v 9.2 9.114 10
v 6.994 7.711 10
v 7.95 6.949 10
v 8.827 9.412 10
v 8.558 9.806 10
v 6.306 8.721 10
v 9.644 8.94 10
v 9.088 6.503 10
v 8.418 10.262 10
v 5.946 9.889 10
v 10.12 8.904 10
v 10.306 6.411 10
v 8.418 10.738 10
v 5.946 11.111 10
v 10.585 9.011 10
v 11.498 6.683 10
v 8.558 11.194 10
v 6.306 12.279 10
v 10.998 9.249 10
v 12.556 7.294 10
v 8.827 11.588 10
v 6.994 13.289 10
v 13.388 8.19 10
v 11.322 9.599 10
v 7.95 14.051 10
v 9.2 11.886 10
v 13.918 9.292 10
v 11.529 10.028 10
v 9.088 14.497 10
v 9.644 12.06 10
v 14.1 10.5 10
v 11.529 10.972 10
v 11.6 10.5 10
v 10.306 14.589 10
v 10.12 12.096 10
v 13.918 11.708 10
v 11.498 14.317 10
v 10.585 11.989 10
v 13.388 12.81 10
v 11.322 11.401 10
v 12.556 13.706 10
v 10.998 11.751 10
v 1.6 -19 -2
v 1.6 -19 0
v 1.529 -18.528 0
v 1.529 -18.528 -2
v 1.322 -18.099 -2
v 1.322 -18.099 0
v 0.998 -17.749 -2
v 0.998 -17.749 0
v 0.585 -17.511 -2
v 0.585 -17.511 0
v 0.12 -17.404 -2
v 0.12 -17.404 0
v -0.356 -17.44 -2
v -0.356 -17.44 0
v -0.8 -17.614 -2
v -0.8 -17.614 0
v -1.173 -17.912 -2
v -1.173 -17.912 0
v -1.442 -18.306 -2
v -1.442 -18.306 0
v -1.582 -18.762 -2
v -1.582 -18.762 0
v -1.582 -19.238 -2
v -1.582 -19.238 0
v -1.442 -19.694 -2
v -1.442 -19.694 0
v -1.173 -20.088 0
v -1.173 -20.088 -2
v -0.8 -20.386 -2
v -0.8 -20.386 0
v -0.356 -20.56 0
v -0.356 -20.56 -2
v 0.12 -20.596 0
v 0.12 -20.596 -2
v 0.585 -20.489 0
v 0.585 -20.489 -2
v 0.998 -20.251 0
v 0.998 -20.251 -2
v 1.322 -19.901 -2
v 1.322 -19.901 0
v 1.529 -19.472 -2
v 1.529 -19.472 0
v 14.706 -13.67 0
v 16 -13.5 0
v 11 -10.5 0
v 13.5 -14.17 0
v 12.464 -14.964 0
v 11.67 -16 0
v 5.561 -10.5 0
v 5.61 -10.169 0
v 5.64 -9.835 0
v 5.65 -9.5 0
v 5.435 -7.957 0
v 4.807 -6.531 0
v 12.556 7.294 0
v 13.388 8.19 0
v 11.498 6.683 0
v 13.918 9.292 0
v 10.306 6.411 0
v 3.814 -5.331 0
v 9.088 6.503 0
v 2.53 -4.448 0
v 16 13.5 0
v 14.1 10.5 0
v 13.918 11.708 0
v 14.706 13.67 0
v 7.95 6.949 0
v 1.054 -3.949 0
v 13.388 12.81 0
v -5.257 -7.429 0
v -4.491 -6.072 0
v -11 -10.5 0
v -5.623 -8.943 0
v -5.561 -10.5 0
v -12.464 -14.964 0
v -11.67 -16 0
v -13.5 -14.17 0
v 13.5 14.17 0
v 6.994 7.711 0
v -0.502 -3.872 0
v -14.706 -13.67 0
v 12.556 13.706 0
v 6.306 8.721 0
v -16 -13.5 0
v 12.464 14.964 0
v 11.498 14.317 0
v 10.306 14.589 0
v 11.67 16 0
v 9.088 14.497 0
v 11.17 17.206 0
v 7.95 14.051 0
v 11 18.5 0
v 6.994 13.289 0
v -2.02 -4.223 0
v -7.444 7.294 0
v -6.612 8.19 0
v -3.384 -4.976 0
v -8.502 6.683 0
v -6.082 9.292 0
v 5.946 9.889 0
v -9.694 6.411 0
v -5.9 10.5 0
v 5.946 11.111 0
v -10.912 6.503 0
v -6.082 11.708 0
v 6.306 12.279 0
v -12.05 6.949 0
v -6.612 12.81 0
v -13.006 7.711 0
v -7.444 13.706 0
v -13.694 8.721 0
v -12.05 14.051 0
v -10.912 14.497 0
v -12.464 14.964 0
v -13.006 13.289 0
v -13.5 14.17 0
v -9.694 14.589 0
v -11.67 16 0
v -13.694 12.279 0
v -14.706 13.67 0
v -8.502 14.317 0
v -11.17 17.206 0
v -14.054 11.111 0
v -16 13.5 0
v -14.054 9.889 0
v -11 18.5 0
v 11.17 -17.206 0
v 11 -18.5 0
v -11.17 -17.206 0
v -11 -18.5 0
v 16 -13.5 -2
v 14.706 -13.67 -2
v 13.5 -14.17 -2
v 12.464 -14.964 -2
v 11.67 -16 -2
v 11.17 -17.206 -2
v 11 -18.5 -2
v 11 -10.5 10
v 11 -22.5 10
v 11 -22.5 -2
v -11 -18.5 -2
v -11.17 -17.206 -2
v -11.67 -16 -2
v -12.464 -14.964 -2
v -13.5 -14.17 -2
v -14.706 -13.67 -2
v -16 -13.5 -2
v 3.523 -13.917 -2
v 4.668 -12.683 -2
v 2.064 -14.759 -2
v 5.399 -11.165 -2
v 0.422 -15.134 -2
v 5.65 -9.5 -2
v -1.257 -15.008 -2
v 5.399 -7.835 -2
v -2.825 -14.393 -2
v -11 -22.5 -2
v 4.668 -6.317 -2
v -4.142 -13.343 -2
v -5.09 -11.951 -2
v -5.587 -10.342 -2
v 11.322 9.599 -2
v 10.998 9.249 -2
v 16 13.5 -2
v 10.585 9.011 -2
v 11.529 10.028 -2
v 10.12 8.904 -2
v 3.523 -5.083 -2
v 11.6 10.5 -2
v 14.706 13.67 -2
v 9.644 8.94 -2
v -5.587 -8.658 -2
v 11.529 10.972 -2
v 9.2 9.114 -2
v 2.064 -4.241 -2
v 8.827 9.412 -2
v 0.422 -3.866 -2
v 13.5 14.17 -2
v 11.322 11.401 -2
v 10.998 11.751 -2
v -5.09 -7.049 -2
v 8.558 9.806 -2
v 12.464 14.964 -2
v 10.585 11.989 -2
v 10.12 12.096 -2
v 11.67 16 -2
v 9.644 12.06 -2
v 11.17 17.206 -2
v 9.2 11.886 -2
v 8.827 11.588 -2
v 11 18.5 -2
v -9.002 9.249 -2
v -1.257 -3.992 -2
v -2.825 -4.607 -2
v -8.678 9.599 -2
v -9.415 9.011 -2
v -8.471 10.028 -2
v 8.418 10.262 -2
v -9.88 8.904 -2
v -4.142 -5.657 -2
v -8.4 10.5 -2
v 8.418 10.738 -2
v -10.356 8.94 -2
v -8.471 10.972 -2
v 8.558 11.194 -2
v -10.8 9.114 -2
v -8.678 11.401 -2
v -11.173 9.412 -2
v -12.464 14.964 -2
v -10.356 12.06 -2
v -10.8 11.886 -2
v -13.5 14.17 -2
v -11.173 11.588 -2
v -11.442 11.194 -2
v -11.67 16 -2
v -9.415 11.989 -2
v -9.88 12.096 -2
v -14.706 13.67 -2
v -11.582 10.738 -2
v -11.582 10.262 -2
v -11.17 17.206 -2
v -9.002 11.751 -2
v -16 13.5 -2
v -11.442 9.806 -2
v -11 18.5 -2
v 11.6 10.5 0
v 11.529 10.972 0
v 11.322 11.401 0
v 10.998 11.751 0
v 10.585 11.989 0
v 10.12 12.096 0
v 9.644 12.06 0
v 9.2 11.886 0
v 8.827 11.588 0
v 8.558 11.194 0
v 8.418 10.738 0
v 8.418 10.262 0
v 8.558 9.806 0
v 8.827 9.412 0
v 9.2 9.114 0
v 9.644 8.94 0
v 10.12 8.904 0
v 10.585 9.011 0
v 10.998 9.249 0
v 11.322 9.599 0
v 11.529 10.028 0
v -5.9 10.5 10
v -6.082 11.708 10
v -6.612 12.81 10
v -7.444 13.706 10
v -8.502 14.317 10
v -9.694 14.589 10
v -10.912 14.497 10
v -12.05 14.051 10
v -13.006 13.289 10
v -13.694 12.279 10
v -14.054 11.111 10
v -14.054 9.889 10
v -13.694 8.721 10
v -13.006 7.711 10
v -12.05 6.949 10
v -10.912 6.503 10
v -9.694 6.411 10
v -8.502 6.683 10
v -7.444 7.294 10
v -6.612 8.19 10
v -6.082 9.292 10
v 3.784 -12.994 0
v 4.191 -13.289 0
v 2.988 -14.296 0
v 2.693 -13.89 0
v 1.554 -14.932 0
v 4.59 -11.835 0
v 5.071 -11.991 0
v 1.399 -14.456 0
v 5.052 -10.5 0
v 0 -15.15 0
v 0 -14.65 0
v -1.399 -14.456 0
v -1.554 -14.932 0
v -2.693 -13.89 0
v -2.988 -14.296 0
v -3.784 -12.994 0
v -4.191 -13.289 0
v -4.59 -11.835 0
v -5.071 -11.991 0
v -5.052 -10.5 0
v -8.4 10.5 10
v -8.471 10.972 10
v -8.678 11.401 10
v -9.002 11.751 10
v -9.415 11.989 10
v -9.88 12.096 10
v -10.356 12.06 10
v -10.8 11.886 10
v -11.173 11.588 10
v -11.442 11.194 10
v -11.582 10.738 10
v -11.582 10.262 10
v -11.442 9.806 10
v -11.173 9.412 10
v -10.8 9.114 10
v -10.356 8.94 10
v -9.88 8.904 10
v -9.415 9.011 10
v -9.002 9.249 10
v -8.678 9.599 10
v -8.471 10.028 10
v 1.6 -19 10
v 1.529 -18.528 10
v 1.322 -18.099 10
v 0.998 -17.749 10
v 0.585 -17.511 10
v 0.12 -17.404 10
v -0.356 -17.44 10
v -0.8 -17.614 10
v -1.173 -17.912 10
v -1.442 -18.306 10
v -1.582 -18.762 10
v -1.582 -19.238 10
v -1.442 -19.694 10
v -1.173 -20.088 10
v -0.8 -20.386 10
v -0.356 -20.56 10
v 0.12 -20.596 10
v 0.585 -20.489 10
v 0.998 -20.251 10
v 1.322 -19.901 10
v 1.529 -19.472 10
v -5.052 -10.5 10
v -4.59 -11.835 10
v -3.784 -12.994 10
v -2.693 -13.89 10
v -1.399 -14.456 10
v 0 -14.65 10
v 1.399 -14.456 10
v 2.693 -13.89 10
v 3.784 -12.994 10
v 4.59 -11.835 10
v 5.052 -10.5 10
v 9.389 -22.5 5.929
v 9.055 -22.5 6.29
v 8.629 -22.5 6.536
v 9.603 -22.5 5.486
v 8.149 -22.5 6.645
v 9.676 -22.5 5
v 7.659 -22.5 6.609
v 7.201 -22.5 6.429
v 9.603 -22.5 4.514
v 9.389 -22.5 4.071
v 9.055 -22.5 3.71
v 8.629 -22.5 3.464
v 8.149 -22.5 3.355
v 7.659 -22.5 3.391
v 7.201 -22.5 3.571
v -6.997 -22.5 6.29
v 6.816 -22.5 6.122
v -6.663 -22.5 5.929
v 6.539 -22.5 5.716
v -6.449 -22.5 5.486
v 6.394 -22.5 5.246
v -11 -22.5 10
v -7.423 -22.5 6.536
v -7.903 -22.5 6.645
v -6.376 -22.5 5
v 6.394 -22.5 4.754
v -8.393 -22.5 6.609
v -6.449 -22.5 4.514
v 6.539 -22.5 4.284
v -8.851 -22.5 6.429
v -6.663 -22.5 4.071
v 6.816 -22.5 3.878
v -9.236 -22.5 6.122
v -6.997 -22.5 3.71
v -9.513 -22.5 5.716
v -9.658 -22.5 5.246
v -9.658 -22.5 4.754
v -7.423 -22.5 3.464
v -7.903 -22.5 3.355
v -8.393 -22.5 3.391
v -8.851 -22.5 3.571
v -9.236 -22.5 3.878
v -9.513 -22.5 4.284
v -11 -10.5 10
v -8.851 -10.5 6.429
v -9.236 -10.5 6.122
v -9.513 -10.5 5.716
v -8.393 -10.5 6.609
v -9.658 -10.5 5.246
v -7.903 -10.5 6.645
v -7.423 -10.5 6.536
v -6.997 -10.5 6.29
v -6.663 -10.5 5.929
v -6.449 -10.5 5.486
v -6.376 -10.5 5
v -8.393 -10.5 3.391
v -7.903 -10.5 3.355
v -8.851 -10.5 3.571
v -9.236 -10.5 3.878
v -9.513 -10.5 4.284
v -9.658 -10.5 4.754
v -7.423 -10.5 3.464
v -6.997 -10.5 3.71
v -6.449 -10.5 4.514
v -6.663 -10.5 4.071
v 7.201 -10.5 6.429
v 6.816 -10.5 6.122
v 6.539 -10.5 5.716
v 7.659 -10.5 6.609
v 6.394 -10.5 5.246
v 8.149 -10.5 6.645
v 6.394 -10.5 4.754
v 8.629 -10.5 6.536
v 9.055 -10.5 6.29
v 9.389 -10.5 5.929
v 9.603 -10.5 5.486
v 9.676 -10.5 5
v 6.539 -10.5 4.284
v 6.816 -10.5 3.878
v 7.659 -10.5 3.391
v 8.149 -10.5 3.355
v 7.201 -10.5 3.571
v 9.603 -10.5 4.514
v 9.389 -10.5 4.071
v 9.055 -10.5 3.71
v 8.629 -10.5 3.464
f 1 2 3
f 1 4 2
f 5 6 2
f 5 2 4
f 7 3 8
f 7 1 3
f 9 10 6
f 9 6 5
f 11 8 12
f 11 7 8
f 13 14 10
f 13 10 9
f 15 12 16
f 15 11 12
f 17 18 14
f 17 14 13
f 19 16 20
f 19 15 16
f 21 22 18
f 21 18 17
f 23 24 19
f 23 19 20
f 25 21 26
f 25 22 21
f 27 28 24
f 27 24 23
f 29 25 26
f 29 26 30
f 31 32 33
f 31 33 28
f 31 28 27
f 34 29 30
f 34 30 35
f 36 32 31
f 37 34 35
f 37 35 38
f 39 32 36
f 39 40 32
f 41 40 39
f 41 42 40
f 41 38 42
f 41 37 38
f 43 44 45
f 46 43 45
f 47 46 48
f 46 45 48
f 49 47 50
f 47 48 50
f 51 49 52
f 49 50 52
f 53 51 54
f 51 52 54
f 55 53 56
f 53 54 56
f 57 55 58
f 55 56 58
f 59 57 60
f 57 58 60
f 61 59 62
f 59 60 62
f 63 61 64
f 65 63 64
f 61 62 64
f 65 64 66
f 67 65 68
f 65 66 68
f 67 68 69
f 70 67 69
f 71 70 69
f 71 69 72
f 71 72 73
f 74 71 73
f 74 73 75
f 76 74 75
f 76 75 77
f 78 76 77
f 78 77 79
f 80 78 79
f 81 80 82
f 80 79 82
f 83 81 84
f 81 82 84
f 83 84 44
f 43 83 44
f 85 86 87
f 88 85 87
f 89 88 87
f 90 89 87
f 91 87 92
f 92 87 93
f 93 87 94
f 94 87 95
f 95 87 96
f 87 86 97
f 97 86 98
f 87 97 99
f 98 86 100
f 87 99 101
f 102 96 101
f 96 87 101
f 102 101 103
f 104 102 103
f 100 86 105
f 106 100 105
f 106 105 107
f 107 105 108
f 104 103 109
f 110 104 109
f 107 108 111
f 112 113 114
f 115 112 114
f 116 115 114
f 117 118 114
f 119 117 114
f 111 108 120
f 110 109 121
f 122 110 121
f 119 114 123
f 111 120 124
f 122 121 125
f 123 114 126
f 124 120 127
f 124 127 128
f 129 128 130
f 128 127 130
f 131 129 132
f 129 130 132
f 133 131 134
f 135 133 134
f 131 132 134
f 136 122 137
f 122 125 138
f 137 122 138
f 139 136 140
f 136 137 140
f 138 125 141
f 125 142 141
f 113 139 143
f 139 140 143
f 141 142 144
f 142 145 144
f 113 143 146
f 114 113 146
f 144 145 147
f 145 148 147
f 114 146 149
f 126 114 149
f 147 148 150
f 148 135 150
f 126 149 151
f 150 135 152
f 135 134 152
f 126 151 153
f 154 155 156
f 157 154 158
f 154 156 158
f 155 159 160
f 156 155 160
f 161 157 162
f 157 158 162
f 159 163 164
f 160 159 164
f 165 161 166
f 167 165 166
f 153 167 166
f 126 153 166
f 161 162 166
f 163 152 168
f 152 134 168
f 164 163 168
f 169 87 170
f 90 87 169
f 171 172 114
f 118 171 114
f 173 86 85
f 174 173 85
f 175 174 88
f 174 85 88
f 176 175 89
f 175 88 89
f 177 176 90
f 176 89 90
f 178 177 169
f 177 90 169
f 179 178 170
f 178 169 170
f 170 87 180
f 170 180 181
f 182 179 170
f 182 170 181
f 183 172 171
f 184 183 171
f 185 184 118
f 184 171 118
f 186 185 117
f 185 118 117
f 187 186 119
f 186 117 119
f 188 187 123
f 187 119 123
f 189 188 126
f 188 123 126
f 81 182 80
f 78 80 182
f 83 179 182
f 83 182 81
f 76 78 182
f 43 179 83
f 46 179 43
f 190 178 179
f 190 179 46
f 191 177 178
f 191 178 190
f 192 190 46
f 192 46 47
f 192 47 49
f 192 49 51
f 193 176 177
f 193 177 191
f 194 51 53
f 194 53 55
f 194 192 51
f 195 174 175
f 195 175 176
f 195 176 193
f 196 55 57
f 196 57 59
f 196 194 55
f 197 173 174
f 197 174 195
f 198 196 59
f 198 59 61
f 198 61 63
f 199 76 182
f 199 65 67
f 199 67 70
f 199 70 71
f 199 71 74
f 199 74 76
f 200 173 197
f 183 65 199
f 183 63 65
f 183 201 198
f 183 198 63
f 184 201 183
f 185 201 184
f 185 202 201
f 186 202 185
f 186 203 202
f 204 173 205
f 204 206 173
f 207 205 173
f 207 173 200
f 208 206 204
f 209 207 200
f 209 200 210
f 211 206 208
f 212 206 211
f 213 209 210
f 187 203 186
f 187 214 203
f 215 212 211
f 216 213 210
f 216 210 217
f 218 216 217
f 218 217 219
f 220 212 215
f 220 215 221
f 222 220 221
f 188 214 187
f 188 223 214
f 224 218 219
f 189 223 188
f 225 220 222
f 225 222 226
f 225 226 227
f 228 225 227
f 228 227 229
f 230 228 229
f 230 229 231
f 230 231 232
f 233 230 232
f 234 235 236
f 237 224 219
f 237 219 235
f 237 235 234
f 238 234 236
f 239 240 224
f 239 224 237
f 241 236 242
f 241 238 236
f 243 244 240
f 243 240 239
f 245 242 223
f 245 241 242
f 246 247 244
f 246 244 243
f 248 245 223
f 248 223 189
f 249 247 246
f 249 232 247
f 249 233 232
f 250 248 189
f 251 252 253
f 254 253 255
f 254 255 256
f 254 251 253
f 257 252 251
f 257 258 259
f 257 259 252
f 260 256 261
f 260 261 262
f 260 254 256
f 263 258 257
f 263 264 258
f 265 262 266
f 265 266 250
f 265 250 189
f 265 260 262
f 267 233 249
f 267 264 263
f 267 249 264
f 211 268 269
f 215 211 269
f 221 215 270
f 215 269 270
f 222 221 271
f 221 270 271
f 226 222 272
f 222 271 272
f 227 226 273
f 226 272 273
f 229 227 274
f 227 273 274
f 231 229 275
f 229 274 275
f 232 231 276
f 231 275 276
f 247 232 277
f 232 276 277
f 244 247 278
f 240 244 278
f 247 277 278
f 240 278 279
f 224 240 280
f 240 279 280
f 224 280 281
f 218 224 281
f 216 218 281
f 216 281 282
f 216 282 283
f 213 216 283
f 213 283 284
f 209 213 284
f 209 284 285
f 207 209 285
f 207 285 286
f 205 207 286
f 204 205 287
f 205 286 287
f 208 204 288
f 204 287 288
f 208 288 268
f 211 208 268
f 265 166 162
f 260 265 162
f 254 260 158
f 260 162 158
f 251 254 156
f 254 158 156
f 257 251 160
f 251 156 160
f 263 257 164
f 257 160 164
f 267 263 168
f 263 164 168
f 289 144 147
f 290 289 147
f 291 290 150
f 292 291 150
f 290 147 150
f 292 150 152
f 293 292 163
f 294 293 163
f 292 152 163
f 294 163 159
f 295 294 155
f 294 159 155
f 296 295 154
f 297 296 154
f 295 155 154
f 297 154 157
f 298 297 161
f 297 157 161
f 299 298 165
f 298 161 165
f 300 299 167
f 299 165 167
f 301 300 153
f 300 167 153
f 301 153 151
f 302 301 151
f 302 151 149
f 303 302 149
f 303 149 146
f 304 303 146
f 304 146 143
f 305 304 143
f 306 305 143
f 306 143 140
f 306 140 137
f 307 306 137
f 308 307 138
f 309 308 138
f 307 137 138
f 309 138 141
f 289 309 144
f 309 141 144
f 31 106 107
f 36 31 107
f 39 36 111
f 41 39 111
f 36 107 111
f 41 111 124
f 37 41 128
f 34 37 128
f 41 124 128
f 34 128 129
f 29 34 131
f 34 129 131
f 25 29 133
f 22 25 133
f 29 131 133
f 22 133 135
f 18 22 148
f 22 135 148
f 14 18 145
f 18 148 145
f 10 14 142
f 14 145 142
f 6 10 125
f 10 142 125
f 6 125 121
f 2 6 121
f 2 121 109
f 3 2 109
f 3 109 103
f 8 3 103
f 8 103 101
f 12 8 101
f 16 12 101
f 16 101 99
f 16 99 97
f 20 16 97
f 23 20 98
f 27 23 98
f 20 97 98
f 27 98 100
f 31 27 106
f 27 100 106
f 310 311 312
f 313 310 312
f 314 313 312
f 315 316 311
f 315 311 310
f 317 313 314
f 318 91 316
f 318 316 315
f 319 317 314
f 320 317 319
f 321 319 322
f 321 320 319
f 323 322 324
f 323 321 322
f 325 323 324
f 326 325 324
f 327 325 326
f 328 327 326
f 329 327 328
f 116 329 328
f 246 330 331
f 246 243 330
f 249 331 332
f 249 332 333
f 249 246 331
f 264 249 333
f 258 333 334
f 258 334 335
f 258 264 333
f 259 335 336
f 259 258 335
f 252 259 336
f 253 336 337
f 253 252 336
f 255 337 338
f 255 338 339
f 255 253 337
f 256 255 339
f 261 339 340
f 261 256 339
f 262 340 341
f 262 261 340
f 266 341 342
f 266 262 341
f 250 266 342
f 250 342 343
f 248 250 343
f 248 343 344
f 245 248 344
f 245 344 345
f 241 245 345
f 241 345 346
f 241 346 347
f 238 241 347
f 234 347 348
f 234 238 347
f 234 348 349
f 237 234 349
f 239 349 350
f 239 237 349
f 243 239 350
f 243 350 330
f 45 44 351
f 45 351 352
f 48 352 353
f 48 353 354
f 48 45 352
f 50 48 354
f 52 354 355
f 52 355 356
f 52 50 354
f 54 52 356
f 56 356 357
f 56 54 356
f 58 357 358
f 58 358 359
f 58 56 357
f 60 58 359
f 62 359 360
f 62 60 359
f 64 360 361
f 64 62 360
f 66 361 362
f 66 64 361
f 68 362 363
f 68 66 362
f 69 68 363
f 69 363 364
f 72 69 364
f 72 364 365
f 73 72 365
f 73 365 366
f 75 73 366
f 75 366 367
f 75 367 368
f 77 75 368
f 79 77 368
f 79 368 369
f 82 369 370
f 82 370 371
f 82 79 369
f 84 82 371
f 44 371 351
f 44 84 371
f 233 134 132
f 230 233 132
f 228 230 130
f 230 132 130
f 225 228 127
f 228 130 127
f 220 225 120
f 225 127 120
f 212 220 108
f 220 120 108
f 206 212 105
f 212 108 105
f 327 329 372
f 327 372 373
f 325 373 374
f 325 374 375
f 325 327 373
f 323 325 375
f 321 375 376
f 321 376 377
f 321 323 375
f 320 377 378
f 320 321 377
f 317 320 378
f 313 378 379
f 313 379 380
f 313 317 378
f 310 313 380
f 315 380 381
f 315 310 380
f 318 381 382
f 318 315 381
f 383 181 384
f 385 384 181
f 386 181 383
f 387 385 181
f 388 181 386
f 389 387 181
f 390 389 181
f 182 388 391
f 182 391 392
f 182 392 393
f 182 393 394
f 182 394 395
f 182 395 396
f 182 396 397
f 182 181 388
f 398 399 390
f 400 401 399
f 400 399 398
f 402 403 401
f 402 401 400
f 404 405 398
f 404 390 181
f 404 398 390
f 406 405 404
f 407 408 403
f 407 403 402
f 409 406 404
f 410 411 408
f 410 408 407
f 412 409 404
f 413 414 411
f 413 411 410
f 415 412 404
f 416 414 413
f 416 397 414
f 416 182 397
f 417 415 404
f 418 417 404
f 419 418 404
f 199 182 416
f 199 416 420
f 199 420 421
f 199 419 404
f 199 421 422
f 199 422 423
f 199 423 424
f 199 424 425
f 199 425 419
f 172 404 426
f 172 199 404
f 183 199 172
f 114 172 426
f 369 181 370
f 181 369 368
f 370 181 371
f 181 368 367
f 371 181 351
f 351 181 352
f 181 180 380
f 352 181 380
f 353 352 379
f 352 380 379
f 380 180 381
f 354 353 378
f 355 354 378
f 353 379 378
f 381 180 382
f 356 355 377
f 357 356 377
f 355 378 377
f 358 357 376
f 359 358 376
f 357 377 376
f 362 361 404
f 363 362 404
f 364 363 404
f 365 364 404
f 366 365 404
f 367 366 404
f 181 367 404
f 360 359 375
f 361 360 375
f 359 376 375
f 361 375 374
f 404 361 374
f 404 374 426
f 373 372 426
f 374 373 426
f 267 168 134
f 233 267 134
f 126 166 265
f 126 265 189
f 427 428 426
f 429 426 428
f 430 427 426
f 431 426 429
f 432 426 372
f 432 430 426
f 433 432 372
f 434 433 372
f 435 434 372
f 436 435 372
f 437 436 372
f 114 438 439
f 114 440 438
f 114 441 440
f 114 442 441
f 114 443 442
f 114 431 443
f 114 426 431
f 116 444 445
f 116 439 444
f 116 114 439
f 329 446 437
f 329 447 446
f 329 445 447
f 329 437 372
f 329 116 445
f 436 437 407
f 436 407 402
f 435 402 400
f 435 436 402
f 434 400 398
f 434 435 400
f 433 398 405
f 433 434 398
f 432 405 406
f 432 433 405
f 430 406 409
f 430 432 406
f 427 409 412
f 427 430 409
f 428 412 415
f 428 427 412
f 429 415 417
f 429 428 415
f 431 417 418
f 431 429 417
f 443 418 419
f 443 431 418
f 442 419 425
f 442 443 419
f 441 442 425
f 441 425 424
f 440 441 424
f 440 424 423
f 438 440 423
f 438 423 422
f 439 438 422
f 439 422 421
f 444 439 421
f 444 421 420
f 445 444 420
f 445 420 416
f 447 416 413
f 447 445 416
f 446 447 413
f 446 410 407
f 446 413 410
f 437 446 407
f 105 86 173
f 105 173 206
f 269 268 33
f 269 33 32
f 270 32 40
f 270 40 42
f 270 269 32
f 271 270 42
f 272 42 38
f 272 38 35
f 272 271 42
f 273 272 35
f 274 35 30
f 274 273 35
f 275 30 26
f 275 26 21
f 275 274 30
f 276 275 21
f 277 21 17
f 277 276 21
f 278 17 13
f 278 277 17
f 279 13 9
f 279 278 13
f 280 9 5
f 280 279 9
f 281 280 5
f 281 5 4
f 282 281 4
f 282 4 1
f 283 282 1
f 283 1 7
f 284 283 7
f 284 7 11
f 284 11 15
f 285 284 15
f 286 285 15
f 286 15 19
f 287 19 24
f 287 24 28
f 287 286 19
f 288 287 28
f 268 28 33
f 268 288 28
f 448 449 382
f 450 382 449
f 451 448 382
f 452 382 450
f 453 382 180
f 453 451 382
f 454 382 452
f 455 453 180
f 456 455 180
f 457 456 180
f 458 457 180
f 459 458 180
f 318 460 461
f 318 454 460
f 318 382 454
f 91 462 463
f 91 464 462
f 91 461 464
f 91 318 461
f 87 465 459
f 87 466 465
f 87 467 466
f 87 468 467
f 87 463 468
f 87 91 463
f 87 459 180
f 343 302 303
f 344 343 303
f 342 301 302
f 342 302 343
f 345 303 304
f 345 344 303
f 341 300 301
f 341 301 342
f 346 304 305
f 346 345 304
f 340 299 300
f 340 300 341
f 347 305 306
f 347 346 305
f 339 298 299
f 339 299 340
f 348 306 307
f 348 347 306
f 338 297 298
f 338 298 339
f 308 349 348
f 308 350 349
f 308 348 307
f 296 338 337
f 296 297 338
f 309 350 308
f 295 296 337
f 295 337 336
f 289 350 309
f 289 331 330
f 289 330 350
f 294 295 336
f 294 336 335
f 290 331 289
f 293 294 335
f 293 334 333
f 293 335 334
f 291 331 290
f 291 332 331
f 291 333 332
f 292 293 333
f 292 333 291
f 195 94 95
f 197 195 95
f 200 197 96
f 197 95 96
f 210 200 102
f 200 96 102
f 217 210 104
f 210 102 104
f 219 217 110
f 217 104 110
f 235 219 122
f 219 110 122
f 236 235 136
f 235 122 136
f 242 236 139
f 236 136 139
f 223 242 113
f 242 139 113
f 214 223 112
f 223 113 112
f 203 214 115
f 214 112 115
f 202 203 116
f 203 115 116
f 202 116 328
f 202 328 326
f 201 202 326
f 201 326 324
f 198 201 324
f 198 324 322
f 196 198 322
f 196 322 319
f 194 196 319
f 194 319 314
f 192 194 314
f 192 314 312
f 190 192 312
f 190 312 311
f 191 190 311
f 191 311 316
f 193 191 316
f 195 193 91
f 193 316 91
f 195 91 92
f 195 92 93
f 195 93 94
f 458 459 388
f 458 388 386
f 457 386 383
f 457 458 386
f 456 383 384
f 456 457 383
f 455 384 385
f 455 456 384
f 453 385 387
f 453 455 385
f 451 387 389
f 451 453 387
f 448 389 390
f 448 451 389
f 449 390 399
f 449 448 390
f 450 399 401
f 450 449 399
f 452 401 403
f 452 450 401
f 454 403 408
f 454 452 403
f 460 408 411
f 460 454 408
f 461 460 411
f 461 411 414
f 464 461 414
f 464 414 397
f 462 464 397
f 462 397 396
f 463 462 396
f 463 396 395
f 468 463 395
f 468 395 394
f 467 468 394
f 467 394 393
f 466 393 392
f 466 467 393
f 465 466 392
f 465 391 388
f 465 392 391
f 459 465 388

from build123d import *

# Parameters (mm, degrees)
SKETCH037_R     = 1.6
SKETCH037_R_2   = 5.65
PAD014_DEPTH    = 2
SKETCH038_R     = 4.1
SKETCH038_R_2   = 1.6
PAD015_DEPTH    = 10
SKETCH039_R     = 1.65
POCKET013_DEPTH = 22.501


with BuildPart() as part:
    # Sketch037 → Pad014 (new body)
    with BuildSketch(Plane.XY):
        with BuildLine():
            ThreePointArc((-16, 13.5), (-12.464466, 14.964466), (-11, 18.5))
            Line((-11, 18.5), (11, 18.5))
            ThreePointArc((11, 18.5), (12.464466, 14.964466), (16, 13.5))
            Line((16, -13.5), (16, 13.5))
            ThreePointArc((16, -13.5), (12.464466, -14.964466), (11, -18.5))
            Line((11, -22.5), (11, -18.5))
            Line((-11, -22.5), (11, -22.5))
            Line((-11, -18.5), (-11, -22.5))
            ThreePointArc((-11, -18.5), (-12.464466, -14.964466), (-16, -13.5))
            Line((-16, 13.5), (-16, -13.5))
        make_face()
        with Locations((-10, 10.5)):
            Circle(SKETCH037_R, mode=Mode.SUBTRACT)
        with Locations((10, 10.5)):
            Circle(SKETCH037_R, mode=Mode.SUBTRACT)
        with Locations((0, -9.5)):
            Circle(SKETCH037_R_2, mode=Mode.SUBTRACT)
        with Locations((0, -19)):
            Circle(SKETCH037_R, mode=Mode.SUBTRACT)
    extrude(amount=-PAD014_DEPTH)

    # Sketch038 → Pad015 (join)
    with BuildSketch(Plane.XY):
        with Locations((-10, 10.5)):
            Circle(SKETCH038_R)
        with Locations((-10, 10.5)):
            Circle(SKETCH038_R_2, mode=Mode.SUBTRACT)
        with Locations((10, 10.5)):
            Circle(SKETCH038_R)
        with Locations((10, 10.5)):
            Circle(SKETCH038_R_2, mode=Mode.SUBTRACT)
        with BuildLine():
            ThreePointArc((-5.05198, -10.5), (0, -14.65), (5.05198, -10.5))
            Line((5.05198, -10.5), (11, -10.5))
            Line((11, -10.5), (11, -22.5))
            Line((11, -22.5), (-11, -22.5))
            Line((-11, -22.5), (-11, -10.5))
            Line((-11, -10.5), (-5.05198, -10.5))
        make_face()
        with Locations((0, -19)):
            Circle(SKETCH038_R_2, mode=Mode.SUBTRACT)
    extrude(amount=PAD015_DEPTH)

    # Sketch039 → Pocket013 (cut, through all)
    with BuildSketch(Plane.XZ):
        with Locations((-8.02599, 5)):
            Circle(SKETCH039_R)
        with Locations((8.02599, 5)):
            Circle(SKETCH039_R)
    extrude(amount=POCKET013_DEPTH, mode=Mode.SUBTRACT)


solid = part.part
